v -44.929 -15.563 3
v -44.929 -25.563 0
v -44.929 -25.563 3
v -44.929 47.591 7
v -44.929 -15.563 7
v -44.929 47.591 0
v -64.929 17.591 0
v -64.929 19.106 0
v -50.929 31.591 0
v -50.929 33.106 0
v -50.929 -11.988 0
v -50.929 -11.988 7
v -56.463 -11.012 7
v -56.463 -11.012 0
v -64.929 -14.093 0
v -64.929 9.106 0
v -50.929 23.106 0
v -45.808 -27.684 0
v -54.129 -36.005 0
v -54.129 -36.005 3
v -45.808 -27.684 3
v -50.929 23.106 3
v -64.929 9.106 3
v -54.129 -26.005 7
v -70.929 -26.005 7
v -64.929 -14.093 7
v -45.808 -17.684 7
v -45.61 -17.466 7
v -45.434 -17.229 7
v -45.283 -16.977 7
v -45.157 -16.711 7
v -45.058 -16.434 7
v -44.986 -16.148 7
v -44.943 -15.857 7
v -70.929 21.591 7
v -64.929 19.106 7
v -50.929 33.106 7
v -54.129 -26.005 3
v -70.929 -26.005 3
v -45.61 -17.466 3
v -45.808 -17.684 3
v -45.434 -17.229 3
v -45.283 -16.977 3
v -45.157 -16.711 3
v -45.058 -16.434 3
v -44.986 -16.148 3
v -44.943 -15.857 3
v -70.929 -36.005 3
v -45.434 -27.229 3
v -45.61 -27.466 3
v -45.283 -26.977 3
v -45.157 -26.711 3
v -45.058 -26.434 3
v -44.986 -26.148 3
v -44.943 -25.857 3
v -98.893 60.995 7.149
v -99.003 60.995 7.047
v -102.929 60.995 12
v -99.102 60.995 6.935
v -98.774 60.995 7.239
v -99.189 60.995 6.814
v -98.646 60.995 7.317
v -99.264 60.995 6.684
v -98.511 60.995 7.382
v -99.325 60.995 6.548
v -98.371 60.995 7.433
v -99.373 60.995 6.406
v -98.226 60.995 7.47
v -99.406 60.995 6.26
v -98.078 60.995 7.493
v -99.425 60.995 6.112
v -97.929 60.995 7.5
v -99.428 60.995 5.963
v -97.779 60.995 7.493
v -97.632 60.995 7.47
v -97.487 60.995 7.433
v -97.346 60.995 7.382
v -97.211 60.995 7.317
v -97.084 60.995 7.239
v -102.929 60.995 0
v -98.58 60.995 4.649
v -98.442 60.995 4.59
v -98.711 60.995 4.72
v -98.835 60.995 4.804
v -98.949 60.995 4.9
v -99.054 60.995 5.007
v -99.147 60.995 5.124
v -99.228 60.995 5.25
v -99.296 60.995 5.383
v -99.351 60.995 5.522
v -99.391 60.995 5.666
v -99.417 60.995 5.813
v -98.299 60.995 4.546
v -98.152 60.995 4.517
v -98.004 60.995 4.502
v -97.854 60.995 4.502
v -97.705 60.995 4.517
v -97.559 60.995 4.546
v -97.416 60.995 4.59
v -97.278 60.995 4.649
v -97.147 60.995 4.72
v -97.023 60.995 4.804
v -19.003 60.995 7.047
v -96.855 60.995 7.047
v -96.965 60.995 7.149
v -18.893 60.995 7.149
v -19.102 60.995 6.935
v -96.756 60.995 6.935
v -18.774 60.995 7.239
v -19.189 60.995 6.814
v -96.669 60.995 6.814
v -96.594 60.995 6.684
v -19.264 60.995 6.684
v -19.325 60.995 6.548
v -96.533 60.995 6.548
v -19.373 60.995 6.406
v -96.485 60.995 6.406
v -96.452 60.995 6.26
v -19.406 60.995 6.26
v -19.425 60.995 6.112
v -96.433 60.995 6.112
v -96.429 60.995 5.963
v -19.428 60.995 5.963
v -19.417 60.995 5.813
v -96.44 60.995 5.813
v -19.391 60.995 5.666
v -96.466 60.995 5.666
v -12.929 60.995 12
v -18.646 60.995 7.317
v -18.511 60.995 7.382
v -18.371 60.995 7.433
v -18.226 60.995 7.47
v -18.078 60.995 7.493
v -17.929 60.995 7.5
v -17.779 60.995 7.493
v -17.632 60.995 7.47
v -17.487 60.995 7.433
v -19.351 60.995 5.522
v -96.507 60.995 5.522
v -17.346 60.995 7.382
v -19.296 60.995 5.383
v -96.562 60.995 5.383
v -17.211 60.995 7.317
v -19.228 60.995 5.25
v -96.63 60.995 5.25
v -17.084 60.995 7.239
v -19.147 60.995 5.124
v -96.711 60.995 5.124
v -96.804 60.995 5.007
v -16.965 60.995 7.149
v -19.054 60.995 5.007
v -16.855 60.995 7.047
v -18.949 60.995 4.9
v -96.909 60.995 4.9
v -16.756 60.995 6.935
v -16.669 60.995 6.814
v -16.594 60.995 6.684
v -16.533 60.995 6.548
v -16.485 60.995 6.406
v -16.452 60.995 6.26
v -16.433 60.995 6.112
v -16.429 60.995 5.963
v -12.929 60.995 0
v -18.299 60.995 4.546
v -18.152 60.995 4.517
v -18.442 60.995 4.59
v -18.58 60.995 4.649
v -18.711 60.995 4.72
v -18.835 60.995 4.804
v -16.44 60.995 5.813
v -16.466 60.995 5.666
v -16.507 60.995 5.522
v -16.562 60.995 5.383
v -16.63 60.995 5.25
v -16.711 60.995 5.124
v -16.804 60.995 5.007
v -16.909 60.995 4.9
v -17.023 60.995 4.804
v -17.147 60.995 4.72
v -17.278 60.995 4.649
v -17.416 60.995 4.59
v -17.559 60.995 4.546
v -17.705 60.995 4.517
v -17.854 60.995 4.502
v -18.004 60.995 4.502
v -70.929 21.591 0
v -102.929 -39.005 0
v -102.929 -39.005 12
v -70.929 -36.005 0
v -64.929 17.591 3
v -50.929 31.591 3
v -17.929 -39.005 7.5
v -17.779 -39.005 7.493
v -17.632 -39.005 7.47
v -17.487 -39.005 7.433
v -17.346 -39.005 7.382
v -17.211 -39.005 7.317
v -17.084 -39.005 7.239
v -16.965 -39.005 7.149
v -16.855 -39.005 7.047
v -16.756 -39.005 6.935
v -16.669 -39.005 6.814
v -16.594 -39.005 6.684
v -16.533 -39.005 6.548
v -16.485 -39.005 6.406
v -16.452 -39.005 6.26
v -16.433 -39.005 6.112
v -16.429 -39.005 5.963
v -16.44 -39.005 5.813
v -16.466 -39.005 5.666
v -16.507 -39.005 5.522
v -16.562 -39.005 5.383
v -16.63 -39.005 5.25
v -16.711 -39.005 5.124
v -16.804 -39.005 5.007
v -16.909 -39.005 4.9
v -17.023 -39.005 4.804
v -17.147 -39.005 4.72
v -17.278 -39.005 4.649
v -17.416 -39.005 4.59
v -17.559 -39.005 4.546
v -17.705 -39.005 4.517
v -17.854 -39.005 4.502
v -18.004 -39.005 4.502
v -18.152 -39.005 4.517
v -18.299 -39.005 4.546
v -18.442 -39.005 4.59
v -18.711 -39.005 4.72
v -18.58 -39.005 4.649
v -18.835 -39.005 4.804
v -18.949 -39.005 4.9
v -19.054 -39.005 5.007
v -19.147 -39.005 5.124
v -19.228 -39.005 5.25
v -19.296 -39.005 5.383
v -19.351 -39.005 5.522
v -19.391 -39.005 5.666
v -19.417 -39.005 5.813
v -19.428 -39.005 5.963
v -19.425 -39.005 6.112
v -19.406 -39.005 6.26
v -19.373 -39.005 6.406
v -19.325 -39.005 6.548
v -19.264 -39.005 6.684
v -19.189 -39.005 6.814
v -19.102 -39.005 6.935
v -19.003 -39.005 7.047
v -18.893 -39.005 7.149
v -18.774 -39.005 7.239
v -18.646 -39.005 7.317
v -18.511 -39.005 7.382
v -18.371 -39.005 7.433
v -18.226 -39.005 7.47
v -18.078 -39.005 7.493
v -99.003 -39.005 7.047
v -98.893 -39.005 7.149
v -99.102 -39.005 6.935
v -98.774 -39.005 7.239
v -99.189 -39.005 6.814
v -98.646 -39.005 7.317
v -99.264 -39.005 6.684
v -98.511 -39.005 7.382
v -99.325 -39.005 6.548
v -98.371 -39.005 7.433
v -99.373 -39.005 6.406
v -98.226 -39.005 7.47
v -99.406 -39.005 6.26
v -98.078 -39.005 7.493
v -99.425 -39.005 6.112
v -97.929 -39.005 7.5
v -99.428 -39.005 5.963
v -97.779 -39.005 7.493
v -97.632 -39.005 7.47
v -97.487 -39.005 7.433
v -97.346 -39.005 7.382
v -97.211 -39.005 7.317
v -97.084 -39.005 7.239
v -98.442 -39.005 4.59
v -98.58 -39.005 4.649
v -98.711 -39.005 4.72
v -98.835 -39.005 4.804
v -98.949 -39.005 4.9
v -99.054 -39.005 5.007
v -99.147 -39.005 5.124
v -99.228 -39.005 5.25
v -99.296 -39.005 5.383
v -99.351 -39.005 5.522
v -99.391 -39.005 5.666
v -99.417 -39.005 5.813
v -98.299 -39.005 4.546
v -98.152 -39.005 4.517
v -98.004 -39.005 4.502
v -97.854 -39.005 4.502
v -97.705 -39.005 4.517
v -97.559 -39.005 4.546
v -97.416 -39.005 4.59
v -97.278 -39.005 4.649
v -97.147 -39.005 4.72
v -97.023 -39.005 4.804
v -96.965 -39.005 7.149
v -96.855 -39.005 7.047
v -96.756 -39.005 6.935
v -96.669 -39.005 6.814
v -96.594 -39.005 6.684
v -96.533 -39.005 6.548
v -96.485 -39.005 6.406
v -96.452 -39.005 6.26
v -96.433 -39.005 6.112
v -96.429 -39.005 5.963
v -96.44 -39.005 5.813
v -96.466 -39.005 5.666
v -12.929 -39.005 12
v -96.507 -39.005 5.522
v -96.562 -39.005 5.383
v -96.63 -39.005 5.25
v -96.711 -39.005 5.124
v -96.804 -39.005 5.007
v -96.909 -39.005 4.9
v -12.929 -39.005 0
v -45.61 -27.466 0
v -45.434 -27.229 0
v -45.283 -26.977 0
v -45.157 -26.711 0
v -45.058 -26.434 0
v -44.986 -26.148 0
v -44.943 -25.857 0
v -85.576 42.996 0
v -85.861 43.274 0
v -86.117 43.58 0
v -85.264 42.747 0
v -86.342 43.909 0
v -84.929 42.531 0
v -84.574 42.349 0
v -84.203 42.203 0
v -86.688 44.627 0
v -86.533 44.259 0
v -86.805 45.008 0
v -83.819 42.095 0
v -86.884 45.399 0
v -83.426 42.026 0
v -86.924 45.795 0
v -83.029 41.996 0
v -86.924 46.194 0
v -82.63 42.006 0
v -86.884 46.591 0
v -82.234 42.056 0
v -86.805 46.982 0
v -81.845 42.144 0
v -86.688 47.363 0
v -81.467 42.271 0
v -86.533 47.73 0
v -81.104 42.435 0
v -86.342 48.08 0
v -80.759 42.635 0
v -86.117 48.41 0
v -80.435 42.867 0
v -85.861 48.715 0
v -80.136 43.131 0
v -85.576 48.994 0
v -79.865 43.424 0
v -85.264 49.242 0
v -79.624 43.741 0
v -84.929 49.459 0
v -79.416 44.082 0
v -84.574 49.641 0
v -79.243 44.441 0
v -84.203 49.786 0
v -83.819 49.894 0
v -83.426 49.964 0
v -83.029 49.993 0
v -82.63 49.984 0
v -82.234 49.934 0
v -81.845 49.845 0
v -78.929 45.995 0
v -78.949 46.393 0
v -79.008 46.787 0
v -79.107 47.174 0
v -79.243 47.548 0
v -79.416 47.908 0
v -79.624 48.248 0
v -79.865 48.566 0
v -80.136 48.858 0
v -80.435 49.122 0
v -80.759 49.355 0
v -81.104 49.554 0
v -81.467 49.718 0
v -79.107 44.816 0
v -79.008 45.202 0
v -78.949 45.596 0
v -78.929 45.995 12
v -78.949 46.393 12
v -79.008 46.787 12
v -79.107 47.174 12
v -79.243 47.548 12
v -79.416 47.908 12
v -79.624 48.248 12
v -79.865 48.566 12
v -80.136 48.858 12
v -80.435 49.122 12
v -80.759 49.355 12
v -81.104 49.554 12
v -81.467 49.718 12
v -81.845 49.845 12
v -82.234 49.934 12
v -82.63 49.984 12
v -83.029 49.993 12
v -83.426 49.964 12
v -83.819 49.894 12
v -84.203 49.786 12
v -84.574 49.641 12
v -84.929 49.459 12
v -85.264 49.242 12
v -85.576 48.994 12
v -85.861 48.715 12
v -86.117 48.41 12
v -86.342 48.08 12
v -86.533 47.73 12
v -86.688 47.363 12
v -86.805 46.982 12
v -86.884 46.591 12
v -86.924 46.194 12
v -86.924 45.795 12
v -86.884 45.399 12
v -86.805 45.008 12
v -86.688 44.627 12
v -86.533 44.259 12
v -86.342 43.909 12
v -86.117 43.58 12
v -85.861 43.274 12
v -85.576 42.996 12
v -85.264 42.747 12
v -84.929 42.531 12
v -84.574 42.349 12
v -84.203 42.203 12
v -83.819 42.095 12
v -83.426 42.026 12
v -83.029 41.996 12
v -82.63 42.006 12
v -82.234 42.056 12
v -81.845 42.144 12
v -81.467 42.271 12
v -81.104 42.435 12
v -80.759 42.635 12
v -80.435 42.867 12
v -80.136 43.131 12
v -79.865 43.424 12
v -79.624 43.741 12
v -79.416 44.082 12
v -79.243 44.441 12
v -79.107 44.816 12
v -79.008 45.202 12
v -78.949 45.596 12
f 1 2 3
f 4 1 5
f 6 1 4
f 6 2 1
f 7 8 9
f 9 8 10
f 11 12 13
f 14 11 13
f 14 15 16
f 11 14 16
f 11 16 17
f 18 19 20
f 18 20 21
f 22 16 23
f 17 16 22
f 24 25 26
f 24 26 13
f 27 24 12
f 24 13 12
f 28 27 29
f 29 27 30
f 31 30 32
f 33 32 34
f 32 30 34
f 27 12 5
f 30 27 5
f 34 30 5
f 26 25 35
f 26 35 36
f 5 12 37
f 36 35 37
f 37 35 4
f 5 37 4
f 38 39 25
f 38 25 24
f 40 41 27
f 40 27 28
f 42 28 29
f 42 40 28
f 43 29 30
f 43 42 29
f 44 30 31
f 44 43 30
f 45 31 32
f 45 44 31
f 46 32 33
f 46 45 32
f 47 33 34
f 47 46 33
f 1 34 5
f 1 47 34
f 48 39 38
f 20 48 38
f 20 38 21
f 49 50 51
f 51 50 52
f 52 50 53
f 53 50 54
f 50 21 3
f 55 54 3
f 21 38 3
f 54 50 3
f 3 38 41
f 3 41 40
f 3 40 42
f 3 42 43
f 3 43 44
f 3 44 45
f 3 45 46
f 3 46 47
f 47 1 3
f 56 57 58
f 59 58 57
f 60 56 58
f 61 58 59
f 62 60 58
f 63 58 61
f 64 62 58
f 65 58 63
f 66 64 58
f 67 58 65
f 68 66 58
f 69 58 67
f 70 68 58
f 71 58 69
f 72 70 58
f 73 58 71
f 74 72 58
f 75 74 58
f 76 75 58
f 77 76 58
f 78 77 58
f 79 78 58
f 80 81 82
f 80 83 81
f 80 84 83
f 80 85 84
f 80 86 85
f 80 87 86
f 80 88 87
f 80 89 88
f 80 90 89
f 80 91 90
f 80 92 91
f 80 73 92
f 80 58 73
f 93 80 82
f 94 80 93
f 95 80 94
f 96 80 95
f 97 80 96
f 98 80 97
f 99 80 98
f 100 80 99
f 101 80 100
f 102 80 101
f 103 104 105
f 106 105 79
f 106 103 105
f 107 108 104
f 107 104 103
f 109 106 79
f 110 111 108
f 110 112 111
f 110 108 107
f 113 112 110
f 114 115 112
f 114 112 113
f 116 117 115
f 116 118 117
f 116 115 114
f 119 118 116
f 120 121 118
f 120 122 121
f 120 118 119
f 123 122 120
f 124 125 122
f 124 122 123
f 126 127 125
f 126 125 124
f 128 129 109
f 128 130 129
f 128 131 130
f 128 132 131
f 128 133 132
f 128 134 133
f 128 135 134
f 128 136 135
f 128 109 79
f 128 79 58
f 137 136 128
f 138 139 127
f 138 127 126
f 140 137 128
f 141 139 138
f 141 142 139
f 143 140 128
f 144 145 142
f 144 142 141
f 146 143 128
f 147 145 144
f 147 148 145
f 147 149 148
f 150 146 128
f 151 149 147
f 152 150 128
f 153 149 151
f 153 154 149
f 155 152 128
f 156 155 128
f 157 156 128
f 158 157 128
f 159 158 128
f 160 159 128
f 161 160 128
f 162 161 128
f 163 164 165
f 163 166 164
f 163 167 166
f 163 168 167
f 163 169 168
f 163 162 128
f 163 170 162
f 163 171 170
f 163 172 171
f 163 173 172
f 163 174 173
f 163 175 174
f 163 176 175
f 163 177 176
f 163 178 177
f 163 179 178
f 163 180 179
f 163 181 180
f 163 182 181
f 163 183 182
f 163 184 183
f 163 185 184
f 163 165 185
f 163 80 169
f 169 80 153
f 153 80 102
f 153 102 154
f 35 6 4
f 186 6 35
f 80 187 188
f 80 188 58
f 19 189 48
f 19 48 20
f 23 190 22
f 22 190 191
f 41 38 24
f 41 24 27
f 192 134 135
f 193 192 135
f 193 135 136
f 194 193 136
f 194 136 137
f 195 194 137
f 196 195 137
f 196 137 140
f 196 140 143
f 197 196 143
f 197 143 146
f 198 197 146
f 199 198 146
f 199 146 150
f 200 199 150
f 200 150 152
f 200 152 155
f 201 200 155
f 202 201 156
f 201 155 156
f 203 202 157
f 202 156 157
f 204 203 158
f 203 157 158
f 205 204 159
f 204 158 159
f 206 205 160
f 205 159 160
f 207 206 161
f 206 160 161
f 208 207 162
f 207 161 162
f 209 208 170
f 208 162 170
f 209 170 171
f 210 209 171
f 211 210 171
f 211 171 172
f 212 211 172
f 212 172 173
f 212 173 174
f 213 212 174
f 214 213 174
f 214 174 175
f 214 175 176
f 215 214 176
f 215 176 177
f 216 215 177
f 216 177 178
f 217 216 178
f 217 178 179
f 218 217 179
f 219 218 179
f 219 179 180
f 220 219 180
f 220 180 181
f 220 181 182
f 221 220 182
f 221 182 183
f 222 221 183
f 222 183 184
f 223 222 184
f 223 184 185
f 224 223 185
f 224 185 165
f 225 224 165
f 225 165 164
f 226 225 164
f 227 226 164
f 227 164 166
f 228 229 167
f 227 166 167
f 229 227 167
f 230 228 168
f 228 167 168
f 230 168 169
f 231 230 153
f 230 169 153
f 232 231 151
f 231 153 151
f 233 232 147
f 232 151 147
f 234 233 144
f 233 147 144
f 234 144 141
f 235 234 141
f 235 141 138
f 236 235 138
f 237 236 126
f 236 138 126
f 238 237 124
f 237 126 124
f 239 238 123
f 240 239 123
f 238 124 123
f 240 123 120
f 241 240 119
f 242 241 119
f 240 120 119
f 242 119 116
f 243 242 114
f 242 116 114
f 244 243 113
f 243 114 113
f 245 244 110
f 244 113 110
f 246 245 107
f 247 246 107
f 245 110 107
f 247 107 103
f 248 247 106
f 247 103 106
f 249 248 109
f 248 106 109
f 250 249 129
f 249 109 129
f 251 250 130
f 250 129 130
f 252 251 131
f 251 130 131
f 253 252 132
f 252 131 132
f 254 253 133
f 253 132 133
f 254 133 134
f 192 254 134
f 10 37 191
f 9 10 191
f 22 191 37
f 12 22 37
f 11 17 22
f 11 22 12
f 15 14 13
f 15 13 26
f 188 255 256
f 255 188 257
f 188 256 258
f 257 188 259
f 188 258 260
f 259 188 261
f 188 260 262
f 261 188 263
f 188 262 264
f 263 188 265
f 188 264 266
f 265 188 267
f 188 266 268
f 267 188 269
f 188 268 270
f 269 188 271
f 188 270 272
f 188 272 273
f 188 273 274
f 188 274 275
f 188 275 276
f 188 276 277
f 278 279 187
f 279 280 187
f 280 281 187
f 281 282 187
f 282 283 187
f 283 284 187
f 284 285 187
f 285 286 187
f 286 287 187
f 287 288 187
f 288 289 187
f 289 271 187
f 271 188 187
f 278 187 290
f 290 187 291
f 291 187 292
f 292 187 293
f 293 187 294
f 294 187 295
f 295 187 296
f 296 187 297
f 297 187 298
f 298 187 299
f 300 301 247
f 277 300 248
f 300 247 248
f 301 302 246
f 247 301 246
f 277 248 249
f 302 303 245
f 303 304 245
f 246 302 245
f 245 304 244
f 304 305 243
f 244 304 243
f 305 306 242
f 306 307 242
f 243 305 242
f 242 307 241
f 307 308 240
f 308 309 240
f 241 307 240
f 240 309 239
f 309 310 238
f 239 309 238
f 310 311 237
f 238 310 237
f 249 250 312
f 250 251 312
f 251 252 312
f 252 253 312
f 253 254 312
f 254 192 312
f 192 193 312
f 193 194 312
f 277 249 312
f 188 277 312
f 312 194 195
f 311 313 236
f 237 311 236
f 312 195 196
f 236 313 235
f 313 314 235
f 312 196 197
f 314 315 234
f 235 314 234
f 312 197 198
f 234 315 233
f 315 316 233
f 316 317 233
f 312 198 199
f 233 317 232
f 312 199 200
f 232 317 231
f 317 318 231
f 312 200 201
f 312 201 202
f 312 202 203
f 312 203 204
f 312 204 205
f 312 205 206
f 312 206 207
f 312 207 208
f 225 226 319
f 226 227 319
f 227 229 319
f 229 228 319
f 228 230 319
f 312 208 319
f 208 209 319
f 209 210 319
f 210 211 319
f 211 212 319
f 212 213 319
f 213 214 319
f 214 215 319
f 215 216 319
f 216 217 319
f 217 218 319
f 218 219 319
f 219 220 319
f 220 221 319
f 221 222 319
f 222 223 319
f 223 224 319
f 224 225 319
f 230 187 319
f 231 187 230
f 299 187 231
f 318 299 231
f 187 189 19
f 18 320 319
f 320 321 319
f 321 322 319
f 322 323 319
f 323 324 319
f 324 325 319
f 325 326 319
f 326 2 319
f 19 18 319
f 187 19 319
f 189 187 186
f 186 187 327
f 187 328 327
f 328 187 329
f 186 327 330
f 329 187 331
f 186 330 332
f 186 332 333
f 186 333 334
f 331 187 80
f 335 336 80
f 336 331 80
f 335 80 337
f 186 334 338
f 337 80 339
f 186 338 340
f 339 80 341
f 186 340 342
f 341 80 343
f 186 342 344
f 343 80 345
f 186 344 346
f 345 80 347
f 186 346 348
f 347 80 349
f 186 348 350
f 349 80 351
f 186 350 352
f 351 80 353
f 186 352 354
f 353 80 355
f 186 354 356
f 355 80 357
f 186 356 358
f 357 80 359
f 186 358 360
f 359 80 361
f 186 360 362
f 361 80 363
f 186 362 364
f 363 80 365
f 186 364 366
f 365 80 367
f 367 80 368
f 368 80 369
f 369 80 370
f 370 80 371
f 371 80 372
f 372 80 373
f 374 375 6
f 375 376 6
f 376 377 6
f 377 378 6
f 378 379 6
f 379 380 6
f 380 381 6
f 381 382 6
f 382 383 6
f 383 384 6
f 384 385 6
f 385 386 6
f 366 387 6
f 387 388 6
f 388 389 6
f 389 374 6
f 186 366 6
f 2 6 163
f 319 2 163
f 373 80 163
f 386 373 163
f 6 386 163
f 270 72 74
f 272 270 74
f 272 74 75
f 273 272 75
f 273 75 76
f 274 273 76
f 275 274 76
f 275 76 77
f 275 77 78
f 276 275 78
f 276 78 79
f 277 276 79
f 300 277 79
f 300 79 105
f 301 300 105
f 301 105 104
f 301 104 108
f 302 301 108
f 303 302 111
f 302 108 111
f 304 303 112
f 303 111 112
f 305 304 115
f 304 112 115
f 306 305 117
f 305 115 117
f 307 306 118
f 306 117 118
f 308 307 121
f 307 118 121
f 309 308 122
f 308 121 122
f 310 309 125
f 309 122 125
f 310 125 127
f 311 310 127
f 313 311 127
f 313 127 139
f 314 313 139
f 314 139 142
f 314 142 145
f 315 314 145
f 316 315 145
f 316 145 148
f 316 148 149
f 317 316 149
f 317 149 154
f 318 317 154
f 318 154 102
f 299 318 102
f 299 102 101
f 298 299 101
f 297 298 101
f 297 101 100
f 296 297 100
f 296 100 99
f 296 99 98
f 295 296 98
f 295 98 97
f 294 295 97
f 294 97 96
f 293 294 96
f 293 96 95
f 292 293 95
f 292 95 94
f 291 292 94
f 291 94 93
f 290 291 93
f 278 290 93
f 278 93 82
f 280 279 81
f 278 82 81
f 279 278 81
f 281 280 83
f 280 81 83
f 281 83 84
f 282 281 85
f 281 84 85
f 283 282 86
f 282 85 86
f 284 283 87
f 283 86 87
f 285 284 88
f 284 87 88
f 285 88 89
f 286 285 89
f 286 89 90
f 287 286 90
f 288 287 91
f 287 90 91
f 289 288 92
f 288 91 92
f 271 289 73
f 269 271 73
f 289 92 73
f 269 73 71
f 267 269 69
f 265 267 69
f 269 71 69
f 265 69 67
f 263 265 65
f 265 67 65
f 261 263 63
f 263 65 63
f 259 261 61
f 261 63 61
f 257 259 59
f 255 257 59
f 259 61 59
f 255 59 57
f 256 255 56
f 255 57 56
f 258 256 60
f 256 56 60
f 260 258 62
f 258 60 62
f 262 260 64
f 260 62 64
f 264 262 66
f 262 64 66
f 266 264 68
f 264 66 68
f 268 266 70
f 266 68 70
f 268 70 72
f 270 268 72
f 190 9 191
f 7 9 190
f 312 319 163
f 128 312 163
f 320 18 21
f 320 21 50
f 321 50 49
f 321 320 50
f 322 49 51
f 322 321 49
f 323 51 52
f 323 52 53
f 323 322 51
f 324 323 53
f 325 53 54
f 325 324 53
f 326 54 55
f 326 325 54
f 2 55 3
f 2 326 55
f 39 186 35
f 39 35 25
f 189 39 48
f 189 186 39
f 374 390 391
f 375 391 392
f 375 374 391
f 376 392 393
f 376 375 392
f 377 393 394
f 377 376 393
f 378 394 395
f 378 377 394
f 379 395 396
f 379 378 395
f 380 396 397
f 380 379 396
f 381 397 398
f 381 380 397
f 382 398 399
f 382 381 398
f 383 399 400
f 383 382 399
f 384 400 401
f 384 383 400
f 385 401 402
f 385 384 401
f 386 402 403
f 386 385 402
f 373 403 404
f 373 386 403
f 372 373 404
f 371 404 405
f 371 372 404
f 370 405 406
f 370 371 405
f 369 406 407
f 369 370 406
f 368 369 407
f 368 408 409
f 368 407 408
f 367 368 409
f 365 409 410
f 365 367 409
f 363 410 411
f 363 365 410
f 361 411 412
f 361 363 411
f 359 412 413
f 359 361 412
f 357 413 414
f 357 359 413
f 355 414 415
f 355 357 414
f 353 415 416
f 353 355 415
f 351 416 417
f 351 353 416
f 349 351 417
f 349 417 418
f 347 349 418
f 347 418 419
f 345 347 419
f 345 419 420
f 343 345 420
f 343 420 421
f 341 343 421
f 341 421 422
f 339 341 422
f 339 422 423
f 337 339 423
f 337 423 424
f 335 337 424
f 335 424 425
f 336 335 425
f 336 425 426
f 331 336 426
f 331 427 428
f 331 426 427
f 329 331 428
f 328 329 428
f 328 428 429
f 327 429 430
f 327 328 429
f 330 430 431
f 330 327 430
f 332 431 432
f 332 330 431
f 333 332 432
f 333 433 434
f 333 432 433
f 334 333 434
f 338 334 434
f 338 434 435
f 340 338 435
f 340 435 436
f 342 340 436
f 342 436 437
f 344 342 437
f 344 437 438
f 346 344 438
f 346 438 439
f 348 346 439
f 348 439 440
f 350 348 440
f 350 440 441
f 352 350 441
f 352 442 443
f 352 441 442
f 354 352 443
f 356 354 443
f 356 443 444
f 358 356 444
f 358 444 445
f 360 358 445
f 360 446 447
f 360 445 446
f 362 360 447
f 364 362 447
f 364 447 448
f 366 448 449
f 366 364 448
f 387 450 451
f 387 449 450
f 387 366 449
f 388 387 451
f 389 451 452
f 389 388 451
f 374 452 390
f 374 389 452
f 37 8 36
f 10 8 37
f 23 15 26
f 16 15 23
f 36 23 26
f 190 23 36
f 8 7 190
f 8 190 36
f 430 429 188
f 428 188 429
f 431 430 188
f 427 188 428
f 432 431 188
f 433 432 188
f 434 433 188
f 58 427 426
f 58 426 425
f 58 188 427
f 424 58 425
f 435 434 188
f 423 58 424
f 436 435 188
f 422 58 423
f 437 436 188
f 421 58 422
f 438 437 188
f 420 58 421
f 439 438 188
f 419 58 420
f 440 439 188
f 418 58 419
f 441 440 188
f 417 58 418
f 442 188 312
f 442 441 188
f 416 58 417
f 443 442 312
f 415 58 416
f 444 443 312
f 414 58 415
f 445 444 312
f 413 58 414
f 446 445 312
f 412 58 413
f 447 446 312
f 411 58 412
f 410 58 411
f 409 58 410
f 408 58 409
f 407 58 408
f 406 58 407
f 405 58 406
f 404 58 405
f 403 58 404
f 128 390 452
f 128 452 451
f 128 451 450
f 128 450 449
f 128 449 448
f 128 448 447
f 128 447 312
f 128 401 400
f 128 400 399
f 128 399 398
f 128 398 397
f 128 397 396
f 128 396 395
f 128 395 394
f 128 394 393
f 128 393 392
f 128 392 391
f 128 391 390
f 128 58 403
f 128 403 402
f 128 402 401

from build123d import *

# Parameters (mm, degrees)
SKETCH1_W           = 90
SKETCH1_H           = 100
BOSS_EXTRUDE1_DEPTH = 12
CUT_EXTRUDE4_DEPTH  = 3
LPATTERN1_DEPTH     = 7
SKETCH1_6_R         = 4
CUT_EXTRUDE6_DEPTH  = 121.244349775
SKETCH3_R           = 1.5
CUT_EXTRUDE5_DEPTH  = 145.008145785


# Read off the part's stored shape, not the designer's step: LPattern1
with BuildPart() as part:
    # Sketch1 → Boss-Extrude1 (new body)
    with BuildSketch(Plane.XY):
        with Locations((-57.928839751, 10.994734202)):
            Rectangle(SKETCH1_W, SKETCH1_H)
    extrude(amount=BOSS_EXTRUDE1_DEPTH)

    # Sketch1<5> → Cut-Extrude4 (cut)
    with BuildSketch(Plane.XY):
        with BuildLine():
            Line((-44.928839751, -25.562781554), (-44.928839751, 37.591400024))
            Line((-44.928839751, 37.591400024), (-70.928839751, 11.591400024))
            Line((-70.928839751, 11.591400024), (-70.928839751, -28.377423907))
            Line((-70.928839751, -28.377423907), (-70.928839751, -36.005265798))
            Line((-70.928839751, -36.005265798), (-54.128683309, -36.005265798))
            Line((-54.128683309, -36.005265798), (-45.807519408, -27.684101897))
            ThreePointArc((-45.807519408, -27.684101897), (-45.157201154, -26.710831851), (-44.928839751, -25.562781554))
        make_face()
        Polygon((-50.928839751, 23.10611865), (-50.928839751, -21.987520776), (-56.463060705, -21.011688304), (-64.928839751, -24.092979887), (-64.928839751, 9.10611865), align=None, mode=Mode.SUBTRACT)
    extrude(amount=CUT_EXTRUDE4_DEPTH, mode=Mode.SUBTRACT)

    # LPattern1 outline → LPattern1 (cut)
    with BuildSketch(Plane.XY):
        with BuildLine():
            ThreePointArc((-45.807519408, -17.684101897), (-45.157201154, -16.710831851), (-44.928839751, -15.562781554))
            Line((-44.928839751, -15.562781554), (-44.928839751, 47.591400024))
            Line((-44.928839751, 47.591400024), (-70.928839751, 21.591400024))
            Line((-70.928839751, 21.591400024), (-70.928839751, -26.005265798))
            Line((-70.928839751, -26.005265798), (-54.128683309, -26.005265798))
            Line((-54.128683309, -26.005265798), (-45.807519408, -17.684101897))
        make_face()
        Polygon((-64.928839751, 19.10611865), (-50.928839751, 33.10611865), (-50.928839751, -11.987520776), (-56.463060705, -11.011688304), (-64.928839751, -14.092979887), align=None, mode=Mode.SUBTRACT)
    extrude(amount=LPATTERN1_DEPTH, mode=Mode.SUBTRACT)

    # Sketch1<6> → Cut-Extrude6 (cut, through all)
    with BuildSketch(Plane.XY):
        with Locations((-82.928839751, 45.994734202)):
            Circle(SKETCH1_6_R)
    extrude(amount=CUT_EXTRUDE6_DEPTH, mode=Mode.SUBTRACT)

    # Sketch3 → Cut-Extrude5 (cut, through all)
    with BuildSketch(Plane(origin=(0, 60.994734202, 0), x_dir=(1, 0, 0), z_dir=(0, 1, 0))):
        with Locations(Location((-17.928839751, -6, 0), (0, 0, 270))):
            Circle(SKETCH3_R)
        with Locations(Location((-97.928839751, -6, 0), (0, 0, 270))):
            Circle(SKETCH3_R)
    extrude(amount=-CUT_EXTRUDE5_DEPTH, mode=Mode.SUBTRACT)


solid = part.part
